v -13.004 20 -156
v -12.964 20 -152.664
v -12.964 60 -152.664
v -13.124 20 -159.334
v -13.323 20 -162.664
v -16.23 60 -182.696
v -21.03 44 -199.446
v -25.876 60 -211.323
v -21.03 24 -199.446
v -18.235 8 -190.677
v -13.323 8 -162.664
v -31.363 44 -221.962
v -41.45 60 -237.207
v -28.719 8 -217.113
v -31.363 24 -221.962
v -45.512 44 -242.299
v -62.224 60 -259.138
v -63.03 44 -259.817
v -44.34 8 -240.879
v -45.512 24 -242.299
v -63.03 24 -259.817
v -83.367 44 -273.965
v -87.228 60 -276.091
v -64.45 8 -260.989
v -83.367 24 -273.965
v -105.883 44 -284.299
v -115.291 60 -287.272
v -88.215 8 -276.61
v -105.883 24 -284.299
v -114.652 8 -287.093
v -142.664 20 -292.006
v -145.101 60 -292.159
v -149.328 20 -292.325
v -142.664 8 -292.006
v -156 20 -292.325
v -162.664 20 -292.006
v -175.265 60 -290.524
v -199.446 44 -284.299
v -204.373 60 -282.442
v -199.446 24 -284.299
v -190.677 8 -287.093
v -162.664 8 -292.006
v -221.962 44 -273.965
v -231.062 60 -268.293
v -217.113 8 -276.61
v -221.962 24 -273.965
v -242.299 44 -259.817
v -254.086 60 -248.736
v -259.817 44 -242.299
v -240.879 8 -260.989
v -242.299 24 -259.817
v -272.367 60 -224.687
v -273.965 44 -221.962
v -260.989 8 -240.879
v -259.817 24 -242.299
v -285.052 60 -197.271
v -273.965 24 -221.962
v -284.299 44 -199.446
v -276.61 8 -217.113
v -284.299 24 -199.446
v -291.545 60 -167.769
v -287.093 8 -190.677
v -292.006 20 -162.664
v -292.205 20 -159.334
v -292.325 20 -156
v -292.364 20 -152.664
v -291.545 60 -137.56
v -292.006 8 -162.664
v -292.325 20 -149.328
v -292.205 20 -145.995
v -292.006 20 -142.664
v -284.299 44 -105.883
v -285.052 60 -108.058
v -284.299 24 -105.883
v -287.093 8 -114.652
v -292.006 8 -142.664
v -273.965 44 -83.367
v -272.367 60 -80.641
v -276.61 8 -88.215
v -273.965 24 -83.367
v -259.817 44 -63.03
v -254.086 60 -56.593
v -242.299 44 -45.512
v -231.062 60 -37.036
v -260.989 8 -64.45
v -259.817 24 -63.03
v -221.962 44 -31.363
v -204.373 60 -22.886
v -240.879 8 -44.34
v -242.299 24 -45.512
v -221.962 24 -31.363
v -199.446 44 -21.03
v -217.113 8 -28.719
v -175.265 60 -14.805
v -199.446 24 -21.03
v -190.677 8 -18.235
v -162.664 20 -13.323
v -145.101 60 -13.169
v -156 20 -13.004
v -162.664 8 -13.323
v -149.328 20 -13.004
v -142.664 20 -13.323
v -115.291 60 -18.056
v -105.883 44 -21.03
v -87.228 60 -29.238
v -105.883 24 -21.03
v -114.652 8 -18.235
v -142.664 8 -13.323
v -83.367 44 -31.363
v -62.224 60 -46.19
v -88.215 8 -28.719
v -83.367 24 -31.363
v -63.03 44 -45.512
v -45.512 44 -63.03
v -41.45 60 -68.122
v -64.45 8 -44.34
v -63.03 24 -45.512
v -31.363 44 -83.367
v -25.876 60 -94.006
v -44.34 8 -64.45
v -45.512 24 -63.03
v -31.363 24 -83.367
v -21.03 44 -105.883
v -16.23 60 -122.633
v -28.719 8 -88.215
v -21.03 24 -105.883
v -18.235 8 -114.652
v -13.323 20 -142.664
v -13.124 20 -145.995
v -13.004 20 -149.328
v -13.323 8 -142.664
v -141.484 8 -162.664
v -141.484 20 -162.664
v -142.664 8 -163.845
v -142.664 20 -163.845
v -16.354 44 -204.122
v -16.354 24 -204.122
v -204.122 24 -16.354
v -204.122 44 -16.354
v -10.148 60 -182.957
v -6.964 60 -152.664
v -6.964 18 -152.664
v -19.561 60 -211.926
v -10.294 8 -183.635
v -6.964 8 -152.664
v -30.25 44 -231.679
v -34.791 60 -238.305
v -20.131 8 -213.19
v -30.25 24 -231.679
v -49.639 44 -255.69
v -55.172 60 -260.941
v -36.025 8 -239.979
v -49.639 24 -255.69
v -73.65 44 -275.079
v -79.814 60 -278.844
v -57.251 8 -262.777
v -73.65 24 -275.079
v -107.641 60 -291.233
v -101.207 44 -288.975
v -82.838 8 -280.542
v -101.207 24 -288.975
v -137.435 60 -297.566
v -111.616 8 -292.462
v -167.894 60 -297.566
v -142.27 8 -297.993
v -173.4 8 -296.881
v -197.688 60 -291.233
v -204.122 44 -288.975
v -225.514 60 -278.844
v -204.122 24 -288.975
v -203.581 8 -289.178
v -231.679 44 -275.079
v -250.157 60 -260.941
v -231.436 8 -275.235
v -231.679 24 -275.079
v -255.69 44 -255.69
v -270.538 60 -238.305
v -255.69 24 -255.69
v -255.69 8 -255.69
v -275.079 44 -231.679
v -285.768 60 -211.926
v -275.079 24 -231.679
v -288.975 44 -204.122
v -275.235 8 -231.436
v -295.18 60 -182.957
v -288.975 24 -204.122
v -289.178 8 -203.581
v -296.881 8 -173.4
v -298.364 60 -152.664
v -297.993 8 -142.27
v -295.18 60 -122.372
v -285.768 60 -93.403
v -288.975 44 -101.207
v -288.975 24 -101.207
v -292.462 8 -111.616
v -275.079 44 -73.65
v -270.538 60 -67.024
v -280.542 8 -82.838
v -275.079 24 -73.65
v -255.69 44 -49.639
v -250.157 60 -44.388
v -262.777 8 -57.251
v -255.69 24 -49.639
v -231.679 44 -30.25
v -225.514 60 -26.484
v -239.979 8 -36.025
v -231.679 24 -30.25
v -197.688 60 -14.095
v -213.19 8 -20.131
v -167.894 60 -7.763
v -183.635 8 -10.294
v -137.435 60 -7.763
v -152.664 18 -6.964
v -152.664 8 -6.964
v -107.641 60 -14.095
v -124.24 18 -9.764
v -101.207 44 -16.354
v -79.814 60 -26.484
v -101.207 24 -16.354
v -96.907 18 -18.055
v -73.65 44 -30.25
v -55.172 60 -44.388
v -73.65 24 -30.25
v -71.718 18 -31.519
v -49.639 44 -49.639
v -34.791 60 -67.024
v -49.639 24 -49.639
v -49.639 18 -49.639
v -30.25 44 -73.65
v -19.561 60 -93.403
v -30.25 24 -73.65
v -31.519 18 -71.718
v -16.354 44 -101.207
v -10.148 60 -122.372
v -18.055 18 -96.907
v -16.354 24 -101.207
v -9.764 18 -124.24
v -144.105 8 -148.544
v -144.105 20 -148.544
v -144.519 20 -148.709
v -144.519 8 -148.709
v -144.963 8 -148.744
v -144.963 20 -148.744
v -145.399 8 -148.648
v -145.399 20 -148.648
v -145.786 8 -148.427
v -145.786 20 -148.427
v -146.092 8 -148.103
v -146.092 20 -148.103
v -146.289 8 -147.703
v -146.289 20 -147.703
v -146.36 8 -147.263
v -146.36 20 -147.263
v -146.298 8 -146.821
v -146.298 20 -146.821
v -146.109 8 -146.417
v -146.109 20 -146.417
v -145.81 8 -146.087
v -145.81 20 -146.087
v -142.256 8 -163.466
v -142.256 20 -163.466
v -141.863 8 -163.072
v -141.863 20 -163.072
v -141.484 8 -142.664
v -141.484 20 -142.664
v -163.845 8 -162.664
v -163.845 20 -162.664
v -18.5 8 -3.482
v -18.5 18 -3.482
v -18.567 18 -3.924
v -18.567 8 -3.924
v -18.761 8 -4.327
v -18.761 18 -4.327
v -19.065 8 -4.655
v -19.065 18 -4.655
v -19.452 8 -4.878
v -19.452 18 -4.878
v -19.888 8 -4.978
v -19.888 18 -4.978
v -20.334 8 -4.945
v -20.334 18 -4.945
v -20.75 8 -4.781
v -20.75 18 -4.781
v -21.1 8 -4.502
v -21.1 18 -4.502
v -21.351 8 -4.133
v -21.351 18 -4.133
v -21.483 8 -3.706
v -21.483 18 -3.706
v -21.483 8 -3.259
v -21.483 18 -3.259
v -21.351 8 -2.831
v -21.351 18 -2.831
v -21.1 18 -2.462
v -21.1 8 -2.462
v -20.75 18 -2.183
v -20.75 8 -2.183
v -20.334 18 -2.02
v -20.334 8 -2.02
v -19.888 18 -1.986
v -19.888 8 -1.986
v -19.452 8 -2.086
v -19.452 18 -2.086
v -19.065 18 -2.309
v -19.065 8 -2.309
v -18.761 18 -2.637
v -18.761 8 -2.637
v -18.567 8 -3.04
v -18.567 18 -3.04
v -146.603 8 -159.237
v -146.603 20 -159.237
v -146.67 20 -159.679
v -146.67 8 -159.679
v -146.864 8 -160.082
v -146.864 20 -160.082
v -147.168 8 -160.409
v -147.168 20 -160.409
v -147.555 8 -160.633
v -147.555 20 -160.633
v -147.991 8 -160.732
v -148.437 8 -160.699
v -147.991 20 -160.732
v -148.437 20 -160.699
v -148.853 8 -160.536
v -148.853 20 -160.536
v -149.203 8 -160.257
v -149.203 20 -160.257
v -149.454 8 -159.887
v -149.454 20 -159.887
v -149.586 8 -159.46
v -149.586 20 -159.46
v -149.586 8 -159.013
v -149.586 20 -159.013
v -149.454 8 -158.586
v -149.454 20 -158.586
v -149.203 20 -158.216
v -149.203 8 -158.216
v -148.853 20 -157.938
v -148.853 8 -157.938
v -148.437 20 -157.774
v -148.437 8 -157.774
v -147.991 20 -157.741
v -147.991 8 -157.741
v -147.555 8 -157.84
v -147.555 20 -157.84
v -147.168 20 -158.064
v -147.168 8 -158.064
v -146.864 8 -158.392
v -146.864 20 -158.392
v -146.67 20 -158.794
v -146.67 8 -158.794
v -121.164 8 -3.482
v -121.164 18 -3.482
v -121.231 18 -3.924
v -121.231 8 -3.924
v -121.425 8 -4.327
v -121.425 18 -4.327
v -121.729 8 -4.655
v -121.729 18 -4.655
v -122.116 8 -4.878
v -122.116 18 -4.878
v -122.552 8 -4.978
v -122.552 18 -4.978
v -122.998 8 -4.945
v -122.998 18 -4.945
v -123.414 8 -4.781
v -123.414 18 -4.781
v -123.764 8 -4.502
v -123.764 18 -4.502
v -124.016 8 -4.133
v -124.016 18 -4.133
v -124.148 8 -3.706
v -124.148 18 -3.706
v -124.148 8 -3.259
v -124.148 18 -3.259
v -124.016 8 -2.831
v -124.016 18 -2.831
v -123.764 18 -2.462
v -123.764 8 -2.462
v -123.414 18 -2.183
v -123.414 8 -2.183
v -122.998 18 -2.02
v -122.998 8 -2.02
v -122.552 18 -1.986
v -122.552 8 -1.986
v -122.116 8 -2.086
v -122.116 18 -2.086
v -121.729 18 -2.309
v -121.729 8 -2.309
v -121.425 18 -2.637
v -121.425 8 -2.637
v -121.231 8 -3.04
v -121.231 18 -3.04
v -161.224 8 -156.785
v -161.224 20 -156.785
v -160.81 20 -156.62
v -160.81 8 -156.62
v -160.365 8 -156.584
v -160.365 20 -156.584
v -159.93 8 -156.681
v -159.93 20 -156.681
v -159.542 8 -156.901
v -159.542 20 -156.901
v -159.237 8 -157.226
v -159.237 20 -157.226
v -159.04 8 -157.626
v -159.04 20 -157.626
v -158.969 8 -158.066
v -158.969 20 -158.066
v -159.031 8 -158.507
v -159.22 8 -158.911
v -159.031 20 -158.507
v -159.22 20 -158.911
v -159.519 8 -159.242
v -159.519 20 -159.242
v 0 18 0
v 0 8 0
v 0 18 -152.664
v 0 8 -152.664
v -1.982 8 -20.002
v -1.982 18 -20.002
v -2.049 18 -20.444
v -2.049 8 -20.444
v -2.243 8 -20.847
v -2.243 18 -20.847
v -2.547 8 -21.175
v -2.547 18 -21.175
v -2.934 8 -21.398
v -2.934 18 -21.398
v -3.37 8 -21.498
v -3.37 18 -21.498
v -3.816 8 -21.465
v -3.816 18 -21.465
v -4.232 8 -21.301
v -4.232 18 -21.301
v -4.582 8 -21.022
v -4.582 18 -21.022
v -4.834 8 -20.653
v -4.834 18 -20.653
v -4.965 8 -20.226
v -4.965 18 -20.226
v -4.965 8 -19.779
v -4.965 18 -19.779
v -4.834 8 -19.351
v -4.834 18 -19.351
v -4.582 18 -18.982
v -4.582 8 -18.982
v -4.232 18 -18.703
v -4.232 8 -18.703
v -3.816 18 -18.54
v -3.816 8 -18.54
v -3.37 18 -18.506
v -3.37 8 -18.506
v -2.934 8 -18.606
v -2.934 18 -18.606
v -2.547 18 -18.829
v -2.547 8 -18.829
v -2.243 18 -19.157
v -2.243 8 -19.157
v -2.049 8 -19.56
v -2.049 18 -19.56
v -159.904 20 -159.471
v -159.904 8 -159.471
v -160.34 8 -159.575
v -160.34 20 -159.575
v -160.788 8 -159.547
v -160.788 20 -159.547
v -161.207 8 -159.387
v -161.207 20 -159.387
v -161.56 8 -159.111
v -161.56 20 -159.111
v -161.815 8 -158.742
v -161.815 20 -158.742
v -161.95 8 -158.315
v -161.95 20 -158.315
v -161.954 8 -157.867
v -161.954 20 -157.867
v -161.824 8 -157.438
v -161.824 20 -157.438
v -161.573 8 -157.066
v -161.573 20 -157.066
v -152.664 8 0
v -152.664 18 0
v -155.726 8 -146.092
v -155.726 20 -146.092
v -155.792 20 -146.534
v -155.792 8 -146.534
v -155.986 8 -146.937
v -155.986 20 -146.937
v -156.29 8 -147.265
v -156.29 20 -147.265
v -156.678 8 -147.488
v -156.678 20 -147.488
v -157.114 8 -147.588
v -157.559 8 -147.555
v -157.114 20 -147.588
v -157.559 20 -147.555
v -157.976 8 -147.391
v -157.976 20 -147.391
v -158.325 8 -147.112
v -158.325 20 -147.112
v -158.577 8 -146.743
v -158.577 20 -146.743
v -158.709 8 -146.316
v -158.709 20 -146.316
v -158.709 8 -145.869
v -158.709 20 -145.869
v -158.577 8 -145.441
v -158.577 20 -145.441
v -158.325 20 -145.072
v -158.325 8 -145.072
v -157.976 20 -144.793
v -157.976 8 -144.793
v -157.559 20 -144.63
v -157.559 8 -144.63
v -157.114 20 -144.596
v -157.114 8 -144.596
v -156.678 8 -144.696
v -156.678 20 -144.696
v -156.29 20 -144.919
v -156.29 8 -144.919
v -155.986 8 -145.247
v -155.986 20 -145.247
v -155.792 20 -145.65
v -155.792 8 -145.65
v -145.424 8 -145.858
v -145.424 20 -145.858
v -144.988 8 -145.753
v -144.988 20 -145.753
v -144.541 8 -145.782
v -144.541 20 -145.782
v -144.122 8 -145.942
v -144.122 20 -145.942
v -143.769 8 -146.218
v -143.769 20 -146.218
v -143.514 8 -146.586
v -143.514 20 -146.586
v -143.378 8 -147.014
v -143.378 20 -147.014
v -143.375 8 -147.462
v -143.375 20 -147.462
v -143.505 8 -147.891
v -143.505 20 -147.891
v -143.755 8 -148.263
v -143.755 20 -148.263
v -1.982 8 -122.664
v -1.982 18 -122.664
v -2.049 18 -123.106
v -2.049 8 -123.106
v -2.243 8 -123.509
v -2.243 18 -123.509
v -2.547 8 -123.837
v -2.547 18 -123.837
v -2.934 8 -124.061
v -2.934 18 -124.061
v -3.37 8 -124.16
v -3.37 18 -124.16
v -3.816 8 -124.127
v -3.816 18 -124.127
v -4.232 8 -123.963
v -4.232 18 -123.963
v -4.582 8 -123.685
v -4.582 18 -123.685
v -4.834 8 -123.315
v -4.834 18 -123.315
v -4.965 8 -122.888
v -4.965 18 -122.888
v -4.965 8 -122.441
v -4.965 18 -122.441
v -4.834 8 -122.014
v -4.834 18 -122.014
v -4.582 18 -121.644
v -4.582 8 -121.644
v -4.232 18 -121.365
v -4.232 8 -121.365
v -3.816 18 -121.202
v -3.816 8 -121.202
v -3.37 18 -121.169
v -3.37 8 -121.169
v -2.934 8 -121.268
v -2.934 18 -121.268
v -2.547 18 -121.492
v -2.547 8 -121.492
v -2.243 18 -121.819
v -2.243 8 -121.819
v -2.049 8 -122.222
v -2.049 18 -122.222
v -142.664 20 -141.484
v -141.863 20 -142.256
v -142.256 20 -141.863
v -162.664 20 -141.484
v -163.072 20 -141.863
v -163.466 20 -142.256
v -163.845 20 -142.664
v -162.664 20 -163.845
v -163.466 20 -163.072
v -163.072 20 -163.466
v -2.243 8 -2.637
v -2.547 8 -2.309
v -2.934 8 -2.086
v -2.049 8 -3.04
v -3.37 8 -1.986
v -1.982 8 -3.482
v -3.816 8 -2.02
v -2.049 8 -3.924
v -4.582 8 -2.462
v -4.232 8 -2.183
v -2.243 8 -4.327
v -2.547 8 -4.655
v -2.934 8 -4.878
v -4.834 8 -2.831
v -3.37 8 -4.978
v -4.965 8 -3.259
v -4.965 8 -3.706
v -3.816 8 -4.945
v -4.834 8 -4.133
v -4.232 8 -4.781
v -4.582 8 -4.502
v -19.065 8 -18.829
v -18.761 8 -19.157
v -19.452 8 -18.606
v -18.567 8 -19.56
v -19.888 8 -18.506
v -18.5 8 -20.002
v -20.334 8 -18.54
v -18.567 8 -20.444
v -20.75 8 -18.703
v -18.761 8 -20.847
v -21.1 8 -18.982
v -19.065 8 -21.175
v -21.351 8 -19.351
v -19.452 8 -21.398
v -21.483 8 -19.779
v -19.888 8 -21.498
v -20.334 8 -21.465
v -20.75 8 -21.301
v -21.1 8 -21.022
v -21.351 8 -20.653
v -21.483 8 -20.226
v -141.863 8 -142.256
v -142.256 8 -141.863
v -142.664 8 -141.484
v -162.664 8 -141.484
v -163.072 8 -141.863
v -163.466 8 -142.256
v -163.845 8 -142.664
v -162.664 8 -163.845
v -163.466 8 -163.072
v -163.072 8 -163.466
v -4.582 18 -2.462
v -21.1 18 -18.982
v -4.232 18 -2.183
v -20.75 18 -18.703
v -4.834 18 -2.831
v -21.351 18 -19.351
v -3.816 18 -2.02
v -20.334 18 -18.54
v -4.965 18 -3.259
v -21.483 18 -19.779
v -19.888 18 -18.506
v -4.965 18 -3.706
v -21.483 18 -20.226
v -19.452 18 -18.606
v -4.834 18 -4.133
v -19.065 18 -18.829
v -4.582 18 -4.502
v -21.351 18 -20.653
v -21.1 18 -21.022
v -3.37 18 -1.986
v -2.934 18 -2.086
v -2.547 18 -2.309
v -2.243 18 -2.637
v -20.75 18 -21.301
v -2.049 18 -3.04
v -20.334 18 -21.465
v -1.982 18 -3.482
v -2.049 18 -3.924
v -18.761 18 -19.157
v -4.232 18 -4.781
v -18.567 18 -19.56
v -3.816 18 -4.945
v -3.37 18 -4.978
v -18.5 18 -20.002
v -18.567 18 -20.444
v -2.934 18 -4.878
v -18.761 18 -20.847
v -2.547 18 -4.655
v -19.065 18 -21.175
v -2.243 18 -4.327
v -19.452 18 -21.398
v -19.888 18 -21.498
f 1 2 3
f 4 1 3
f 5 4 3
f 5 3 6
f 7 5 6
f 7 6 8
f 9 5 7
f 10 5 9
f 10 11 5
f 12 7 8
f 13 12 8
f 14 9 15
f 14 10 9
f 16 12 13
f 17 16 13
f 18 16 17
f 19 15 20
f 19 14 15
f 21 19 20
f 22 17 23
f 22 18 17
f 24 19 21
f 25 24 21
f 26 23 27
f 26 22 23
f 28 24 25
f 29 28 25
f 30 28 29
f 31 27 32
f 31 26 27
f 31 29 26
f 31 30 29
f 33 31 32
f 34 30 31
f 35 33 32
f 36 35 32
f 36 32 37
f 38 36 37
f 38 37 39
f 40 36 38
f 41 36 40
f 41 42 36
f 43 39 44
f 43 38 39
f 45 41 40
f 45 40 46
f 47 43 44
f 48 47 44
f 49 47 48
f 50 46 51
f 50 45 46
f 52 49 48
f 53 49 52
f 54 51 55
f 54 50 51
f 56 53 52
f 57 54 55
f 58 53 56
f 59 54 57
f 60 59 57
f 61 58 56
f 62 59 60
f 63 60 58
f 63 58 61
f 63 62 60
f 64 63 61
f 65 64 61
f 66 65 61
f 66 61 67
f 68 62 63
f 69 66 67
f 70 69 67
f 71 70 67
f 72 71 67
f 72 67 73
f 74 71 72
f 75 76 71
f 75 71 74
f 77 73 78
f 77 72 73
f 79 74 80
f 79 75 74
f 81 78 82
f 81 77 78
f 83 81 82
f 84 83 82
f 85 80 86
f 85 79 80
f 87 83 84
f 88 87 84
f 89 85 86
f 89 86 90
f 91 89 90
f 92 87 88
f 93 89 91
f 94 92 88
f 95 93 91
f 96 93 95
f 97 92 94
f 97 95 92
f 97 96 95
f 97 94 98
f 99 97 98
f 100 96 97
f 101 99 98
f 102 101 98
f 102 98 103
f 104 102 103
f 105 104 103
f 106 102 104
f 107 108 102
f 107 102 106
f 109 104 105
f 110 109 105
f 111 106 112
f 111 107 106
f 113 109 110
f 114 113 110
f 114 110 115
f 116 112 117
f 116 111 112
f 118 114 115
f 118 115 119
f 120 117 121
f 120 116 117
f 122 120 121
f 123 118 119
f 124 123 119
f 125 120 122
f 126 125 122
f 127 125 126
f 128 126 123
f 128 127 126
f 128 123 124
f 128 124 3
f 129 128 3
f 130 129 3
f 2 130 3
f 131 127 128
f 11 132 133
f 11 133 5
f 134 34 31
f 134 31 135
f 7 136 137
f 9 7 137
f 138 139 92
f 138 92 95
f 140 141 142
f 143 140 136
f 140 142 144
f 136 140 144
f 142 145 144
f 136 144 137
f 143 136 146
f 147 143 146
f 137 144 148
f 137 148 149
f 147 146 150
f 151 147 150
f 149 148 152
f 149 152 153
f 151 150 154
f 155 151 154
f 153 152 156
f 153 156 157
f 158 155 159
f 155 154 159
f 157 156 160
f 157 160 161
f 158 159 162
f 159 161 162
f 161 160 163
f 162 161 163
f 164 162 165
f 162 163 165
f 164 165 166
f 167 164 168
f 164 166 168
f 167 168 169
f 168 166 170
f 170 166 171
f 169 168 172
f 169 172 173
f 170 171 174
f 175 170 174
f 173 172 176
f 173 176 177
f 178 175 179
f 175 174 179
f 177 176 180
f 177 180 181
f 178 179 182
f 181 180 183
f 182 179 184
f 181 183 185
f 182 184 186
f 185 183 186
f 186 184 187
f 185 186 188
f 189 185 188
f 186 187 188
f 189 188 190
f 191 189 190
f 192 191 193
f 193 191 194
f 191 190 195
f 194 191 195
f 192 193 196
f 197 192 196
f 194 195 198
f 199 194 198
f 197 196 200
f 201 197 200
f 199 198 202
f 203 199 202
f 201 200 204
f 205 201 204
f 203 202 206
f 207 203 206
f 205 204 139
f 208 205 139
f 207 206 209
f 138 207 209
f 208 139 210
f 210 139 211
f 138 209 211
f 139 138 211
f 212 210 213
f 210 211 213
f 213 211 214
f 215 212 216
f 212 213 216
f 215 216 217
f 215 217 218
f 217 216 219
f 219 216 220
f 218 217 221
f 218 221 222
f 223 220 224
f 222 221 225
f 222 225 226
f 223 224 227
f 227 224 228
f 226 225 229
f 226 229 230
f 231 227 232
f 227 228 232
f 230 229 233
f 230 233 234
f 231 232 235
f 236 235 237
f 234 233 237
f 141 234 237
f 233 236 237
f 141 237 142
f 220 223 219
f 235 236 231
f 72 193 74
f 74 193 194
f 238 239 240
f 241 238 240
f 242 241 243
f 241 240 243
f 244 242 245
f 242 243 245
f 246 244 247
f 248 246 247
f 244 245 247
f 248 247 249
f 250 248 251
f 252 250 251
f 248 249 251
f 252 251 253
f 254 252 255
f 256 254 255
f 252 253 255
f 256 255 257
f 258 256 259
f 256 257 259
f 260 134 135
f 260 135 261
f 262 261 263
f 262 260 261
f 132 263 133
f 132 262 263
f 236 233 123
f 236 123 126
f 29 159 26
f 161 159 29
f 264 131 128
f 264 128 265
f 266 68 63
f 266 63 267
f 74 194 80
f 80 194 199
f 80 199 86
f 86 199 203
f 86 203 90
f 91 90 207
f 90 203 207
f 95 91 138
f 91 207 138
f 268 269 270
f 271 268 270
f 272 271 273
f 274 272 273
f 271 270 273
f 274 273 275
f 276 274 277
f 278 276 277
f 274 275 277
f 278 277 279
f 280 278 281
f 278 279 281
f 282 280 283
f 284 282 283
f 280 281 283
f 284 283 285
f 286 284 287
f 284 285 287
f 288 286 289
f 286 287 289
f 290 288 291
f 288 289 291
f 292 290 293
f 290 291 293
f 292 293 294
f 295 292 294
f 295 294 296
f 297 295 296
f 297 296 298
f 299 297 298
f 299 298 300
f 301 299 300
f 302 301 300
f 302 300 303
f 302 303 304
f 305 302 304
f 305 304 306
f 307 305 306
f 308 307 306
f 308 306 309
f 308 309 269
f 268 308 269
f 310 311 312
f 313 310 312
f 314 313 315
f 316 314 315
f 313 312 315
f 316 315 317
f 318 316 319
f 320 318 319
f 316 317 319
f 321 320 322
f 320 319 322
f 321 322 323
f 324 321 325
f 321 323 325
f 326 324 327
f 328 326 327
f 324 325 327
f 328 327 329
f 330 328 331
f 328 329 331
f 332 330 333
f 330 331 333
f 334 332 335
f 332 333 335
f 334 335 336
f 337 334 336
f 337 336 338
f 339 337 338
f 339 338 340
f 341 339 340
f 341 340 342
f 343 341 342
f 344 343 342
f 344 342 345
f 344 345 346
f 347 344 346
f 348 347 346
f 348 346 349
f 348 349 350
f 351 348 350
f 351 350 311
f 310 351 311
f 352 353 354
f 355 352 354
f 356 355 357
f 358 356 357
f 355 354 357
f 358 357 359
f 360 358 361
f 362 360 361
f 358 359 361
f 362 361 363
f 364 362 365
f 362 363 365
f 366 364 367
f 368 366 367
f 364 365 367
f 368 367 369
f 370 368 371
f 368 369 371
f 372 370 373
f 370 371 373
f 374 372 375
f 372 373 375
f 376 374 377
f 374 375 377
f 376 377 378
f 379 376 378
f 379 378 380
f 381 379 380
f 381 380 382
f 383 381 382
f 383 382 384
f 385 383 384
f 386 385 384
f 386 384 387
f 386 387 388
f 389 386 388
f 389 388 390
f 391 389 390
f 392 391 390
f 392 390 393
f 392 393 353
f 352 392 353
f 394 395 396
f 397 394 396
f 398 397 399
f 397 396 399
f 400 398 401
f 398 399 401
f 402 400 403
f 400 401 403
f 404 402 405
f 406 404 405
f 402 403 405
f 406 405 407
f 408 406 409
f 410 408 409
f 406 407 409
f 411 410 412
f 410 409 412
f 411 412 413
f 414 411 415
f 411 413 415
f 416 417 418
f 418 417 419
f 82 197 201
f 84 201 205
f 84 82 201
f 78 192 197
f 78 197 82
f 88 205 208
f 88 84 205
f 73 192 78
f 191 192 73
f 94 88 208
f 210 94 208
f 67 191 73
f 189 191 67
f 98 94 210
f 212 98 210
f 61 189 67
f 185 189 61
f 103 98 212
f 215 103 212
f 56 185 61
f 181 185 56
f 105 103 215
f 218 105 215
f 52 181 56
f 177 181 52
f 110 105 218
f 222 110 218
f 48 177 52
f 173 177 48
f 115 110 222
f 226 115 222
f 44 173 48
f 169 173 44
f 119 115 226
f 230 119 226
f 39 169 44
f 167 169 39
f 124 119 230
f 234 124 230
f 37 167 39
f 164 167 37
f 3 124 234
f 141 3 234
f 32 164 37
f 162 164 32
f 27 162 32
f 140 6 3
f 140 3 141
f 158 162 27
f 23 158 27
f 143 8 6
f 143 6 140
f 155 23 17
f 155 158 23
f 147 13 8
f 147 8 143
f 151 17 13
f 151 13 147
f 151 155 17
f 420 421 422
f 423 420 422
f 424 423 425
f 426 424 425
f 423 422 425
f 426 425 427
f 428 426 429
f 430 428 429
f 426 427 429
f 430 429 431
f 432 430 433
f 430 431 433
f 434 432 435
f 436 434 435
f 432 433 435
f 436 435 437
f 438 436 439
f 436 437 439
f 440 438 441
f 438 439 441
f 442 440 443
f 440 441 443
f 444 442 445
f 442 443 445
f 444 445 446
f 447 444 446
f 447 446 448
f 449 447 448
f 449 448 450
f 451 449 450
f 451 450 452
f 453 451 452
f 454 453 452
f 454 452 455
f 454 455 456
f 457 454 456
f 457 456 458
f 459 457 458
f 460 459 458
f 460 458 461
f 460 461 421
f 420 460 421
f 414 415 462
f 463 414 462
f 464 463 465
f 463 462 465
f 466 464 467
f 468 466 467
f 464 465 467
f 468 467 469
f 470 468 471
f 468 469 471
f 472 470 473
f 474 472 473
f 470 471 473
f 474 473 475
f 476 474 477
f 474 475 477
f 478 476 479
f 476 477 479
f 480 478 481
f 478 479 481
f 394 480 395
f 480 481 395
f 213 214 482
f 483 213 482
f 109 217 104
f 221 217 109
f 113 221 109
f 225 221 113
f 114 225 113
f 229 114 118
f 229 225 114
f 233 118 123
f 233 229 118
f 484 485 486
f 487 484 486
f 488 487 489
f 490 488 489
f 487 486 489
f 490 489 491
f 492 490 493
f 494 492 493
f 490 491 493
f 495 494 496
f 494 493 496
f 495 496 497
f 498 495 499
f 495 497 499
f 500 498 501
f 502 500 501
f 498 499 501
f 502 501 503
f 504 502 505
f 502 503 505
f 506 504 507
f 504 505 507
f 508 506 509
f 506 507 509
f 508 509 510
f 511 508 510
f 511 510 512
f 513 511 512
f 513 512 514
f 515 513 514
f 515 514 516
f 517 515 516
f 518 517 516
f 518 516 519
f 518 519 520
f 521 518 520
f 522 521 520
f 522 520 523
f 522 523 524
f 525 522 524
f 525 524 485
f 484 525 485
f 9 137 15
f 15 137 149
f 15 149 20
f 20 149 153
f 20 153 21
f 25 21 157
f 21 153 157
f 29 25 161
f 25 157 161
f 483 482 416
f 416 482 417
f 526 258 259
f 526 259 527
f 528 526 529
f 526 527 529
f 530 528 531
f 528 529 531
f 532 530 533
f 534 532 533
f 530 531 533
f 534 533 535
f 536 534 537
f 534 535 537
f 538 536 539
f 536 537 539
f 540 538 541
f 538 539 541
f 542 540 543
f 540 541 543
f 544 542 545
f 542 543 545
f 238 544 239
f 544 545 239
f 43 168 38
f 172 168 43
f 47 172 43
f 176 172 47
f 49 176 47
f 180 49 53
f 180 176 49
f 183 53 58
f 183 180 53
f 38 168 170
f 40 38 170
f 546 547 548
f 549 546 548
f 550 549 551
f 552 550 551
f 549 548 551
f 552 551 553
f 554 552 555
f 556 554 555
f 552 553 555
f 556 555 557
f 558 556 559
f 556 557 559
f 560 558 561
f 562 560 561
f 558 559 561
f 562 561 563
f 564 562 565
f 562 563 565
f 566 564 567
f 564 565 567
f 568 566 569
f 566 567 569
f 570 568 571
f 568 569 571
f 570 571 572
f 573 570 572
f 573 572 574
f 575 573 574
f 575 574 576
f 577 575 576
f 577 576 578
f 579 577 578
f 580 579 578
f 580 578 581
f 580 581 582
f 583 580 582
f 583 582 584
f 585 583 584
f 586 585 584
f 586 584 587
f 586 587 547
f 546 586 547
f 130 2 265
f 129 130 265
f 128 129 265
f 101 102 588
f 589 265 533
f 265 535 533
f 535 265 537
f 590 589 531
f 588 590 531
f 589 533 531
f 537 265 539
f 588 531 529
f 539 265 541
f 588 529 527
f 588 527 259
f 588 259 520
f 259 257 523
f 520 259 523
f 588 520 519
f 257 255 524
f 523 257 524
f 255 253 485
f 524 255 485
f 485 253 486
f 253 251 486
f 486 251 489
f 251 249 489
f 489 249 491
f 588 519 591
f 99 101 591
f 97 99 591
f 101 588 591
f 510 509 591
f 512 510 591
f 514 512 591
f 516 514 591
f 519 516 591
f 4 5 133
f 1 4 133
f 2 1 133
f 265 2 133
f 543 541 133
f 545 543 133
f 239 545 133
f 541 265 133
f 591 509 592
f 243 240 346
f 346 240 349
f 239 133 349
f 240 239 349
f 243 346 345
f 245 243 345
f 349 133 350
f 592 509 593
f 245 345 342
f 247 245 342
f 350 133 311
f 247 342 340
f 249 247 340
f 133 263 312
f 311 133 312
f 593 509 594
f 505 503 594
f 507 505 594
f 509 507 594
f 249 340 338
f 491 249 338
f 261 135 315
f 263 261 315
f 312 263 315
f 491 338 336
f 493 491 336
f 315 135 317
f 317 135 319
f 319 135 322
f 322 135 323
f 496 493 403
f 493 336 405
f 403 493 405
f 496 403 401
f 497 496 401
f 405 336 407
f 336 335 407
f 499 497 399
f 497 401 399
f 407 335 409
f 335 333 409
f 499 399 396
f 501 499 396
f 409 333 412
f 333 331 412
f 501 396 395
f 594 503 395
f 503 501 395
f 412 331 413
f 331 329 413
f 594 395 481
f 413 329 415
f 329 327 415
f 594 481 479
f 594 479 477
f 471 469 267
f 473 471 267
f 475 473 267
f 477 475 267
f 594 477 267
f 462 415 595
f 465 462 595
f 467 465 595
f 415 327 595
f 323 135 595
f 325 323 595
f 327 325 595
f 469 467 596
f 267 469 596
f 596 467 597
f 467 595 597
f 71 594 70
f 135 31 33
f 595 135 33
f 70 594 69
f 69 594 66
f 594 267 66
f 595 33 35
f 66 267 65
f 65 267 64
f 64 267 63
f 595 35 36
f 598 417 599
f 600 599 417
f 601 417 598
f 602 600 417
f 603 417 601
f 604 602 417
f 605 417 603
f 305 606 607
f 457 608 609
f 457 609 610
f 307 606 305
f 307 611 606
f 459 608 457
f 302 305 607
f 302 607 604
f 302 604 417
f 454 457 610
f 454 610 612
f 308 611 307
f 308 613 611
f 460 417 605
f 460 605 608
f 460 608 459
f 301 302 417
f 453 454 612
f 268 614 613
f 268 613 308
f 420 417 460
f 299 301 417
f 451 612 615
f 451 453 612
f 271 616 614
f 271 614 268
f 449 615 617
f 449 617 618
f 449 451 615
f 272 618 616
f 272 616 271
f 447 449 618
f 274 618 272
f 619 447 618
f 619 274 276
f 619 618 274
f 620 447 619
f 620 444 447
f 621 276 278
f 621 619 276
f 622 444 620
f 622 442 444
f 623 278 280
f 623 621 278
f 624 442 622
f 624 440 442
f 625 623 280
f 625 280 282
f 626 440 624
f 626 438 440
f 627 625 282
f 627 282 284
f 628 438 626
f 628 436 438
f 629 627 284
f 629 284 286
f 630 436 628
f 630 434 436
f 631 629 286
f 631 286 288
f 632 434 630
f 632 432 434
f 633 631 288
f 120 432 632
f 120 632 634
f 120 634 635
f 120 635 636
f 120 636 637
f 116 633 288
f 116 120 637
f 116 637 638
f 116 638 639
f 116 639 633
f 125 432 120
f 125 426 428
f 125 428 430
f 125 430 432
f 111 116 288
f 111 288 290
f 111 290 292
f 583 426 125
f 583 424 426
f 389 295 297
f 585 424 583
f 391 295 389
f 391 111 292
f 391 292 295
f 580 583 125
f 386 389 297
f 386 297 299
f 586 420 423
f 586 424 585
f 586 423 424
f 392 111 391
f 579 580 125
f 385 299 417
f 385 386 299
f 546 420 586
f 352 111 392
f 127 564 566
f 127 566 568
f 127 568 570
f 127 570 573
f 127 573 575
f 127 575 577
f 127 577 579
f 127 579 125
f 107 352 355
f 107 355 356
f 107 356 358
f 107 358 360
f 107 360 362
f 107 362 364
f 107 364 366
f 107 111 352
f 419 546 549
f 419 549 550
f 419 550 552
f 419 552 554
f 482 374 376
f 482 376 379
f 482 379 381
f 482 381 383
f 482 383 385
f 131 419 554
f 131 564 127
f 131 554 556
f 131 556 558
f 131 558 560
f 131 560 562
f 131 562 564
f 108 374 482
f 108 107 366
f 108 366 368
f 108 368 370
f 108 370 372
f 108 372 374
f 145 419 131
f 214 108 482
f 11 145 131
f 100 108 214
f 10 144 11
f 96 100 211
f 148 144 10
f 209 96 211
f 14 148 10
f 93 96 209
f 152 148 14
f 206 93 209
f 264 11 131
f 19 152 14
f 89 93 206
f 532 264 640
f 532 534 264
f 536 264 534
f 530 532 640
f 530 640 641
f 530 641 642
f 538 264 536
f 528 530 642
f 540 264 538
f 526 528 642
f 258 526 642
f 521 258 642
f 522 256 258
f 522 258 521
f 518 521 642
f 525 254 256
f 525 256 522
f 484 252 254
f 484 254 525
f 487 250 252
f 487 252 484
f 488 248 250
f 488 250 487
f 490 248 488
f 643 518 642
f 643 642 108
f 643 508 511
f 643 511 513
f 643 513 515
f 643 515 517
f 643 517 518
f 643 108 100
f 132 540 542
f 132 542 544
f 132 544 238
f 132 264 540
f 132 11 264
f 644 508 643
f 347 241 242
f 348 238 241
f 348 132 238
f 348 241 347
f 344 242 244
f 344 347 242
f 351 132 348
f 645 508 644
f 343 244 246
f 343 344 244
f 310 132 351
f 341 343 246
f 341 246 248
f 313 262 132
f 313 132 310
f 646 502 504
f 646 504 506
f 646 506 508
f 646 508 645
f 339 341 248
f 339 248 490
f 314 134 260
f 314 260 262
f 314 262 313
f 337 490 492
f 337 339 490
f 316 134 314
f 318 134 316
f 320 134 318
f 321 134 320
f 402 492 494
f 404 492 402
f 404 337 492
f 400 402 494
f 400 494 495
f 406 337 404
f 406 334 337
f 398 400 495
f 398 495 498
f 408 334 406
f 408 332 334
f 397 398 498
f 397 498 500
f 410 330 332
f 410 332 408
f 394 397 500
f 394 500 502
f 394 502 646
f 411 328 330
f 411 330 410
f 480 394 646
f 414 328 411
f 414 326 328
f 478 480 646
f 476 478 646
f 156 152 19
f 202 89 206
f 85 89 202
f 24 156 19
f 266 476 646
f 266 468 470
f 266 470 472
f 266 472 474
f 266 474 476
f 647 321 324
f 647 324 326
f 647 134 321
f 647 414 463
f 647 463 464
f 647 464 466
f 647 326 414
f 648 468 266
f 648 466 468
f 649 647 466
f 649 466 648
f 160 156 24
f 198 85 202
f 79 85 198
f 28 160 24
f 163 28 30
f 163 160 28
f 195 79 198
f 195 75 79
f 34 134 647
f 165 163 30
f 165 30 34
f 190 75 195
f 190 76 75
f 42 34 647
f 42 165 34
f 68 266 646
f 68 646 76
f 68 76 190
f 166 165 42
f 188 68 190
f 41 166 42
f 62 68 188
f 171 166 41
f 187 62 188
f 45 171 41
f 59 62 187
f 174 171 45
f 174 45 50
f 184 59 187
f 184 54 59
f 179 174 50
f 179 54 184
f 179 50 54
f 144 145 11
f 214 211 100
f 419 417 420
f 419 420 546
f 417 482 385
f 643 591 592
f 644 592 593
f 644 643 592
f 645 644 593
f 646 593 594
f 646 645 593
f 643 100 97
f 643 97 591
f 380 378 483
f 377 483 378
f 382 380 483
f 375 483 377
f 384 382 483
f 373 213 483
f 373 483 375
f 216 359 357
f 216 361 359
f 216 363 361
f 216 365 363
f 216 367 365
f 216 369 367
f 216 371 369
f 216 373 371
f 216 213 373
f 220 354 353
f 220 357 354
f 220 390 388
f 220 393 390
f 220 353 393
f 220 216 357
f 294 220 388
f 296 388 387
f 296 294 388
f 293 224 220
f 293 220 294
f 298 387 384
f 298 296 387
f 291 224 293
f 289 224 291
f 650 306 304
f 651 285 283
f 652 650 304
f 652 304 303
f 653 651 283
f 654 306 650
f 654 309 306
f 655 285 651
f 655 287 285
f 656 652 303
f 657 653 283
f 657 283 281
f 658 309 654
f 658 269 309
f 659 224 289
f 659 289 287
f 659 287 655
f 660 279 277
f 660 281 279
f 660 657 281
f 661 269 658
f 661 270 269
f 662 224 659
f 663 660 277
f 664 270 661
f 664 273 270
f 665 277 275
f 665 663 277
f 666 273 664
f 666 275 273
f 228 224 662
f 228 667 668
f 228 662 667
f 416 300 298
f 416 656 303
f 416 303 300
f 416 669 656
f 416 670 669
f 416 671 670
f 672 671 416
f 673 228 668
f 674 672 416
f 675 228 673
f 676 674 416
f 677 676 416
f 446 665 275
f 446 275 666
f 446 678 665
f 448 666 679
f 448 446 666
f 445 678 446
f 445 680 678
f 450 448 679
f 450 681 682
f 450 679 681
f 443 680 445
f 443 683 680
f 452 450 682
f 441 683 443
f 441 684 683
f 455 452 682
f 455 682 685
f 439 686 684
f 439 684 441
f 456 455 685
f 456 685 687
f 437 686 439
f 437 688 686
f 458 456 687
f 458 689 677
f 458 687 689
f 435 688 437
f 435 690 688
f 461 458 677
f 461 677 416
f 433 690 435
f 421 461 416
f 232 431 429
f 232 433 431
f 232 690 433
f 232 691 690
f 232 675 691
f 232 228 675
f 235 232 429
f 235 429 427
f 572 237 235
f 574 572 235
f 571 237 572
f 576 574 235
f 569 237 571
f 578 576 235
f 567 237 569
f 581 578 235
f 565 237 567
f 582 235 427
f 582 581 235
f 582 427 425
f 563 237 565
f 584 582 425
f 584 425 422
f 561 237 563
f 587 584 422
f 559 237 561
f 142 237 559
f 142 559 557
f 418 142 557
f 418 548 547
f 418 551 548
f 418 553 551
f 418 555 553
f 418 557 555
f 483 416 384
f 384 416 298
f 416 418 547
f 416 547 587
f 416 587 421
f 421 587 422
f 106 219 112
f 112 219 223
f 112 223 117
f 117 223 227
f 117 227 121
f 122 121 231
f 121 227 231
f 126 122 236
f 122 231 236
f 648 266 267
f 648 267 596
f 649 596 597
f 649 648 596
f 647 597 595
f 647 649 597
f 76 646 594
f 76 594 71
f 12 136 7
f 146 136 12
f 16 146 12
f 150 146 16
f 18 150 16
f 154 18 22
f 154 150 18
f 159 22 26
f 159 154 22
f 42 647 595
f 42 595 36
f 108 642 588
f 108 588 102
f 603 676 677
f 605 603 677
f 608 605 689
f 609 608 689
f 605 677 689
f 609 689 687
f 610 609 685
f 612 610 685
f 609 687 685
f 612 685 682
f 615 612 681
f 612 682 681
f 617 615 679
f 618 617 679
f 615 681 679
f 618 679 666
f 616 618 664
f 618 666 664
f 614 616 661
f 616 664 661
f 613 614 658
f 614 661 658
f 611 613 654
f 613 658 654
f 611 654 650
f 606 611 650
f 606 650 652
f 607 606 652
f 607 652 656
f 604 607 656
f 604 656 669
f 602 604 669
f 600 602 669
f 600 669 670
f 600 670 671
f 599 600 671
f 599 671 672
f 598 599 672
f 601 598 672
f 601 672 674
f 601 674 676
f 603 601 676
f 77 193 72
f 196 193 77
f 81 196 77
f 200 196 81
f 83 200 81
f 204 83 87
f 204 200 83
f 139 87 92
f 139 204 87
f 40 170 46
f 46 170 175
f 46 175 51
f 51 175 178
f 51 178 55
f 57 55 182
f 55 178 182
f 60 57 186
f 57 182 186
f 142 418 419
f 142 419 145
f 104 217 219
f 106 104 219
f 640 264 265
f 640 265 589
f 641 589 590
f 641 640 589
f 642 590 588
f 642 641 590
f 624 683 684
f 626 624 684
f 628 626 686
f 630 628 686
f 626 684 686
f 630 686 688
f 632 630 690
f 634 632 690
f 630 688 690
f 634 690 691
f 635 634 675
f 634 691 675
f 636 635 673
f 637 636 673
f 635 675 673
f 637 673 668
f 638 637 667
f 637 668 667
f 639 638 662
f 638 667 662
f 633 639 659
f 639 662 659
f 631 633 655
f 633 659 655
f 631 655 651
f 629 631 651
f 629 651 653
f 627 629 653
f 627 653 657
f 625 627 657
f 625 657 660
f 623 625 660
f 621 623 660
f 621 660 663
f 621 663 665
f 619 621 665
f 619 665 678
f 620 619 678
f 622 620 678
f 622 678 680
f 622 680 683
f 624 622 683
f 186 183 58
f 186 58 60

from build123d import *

# Parameters (mm, degrees)
SKETCH1_R           = 145.7
SKETCH1_R_2         = 139.7
BOSS_EXTRUDE1_DEPTH = 60
SKETCH2_R           = 15
BOSS_EXTRUDE2_DEPTH = 12
BOSS_EXTRUDE3_DEPTH = 10
SKETCH4_R           = 1.5
CUT_EXTRUDE1_DEPTH  = 62
SKETCH1_2_R         = 145.7
SKETCH1_2_R_2       = 139.7
CUT_EXTRUDE2_DEPTH  = 8
SKETCH5_W           = 20
SKETCH5_H           = 120
CUT_EXTRUDE3_DEPTH  = 55
CIRPATTERN1_COUNT   = 4
SKETCH6_R           = 1.5
CUT_EXTRUDE4_DEPTH  = 37


with BuildPart() as part:
    # Sketch1 → Boss-Extrude1 (new body)
    with BuildSketch(Plane(origin=(0, 0, 0), x_dir=(1, 0, 0), z_dir=(0, 1, 0))):
        with Locations((-152.664354058, 152.664354058)):
            Circle(SKETCH1_R)
        with Locations((-152.664354058, 152.664354058)):
            Circle(SKETCH1_R_2, mode=Mode.SUBTRACT)
    extrude(amount=BOSS_EXTRUDE1_DEPTH)

    # Sketch2 → Boss-Extrude2 (add)
    with BuildSketch(Plane(origin=(0, 8, 0), x_dir=(-1, 0, 0), z_dir=(0, -1, 0))):
        with BuildLine():
            ThreePointArc((13.322723524, 162.664354058), (12.964354058, 152.664354058), (13.322723524, 142.664354058))
            Line((13.322723524, 142.664354058), (137.664354058, 142.664354058))
            Line((137.664354058, 142.664354058), (141.484014171, 142.664354058))
            ThreePointArc((141.484014171, 142.664354058), (137.664354058, 152.664354058), (141.484014171, 162.664354058))
            Line((141.484014171, 162.664354058), (137.664354058, 162.664354058))
            Line((137.664354058, 162.664354058), (13.322723524, 162.664354058))
        make_face()
        with BuildLine():
            ThreePointArc((162.664354058, 292.005984593), (152.664354058, 292.364354058), (142.664354058, 292.005984593))
            Line((142.664354058, 292.005984593), (142.664354058, 167.664354058))
            Line((142.664354058, 167.664354058), (142.664354058, 163.844693946))
            ThreePointArc((142.664354058, 163.844693946), (152.664354058, 167.664354058), (162.664354058, 163.844693946))
            Line((162.664354058, 163.844693946), (162.664354058, 167.664354058))
            Line((162.664354058, 167.664354058), (162.664354058, 292.005984593))
        make_face()
        with BuildLine():
            Line((167.664354058, 142.664354058), (292.005984593, 142.664354058))
            ThreePointArc((292.005984593, 142.664354058), (292.274732945, 147.661144372), (292.364354058, 152.664354058))
            ThreePointArc((292.364354058, 152.664354058), (292.274732945, 157.667563745), (292.005984593, 162.664354058))
            Line((292.005984593, 162.664354058), (167.664354058, 162.664354058))
            Line((167.664354058, 162.664354058), (163.844693946, 162.664354058))
            ThreePointArc((163.844693946, 162.664354058), (166.676939443, 158.016685405), (167.664354058, 152.664354058))
            ThreePointArc((167.664354058, 152.664354058), (166.676939443, 147.312022712), (163.844693946, 142.664354058))
            Line((163.844693946, 142.664354058), (167.664354058, 142.664354058))
        make_face()
        with BuildLine():
            Line((142.664354058, 141.484014171), (142.664354058, 137.664354058))
            Line((142.664354058, 137.664354058), (142.664354058, 13.322723524))
            ThreePointArc((142.664354058, 13.322723524), (152.664354058, 12.964354058), (162.664354058, 13.322723524))
            Line((162.664354058, 13.322723524), (162.664354058, 137.664354058))
            Line((162.664354058, 137.664354058), (162.664354058, 141.484014171))
            ThreePointArc((162.664354058, 141.484014171), (152.664354058, 137.664354058), (142.664354058, 141.484014171))
        make_face()
        with Locations((152.664354058, 152.664354058)):
            Circle(SKETCH2_R)
    extrude(amount=-BOSS_EXTRUDE2_DEPTH)

    # Sketch3 → Boss-Extrude3 (add)
    with BuildSketch(Plane(origin=(0, 8, 0), x_dir=(-1, 0, 0), z_dir=(0, -1, 0))):
        with BuildLine():
            Line((152.664354058, 6.964354058), (152.664354058, 0))
            Line((152.664354058, 0), (0, 0))
            Line((0, 0), (0, 152.664354058))
            Line((0, 152.664354058), (6.964354058, 152.664354058))
            ThreePointArc((6.964354058, 152.664354058), (49.638896039, 49.638896039), (152.664354058, 6.964354058))
        make_face()
    extrude(amount=-BOSS_EXTRUDE3_DEPTH)

    # Sketch4 → Cut-Extrude1 (cut)
    with BuildSketch(Plane(origin=(0, 18, 0), x_dir=(1, 0, 0), z_dir=(0, 1, 0))):
        with Locations((-122.664354058, 3.482177029)):
            Circle(SKETCH4_R)
        with Locations((-20, 3.482177029)):
            Circle(SKETCH4_R)
        with Locations((-20, 20.002177029)):
            Circle(SKETCH4_R)
        with Locations((-3.482177029, 20.002177029)):
            Circle(SKETCH4_R)
        with Locations((-3.482177029, 3.482177029)):
            Circle(SKETCH4_R)
        with Locations((-3.482177029, 122.664354058)):
            Circle(SKETCH4_R)
    extrude(amount=-CUT_EXTRUDE1_DEPTH, mode=Mode.SUBTRACT)

    # Sketch1<2> → Cut-Extrude2 (cut)
    with BuildSketch(Plane(origin=(0, 0, 0), x_dir=(1, 0, 0), z_dir=(0, 1, 0))):
        with Locations((-152.664354058, 152.664354058)):
            Circle(SKETCH1_2_R)
        with Locations((-152.664354058, 152.664354058)):
            Circle(SKETCH1_2_R_2, mode=Mode.SUBTRACT)
    extrude(amount=CUT_EXTRUDE2_DEPTH, mode=Mode.SUBTRACT)

    # Sketch5 → Cut-Extrude3 (cut)
    with BuildSketch(Plane(origin=(-255.689812077, 0, -255.689812077), x_dir=(0, -1, 0), z_dir=(-0.707106781, 0, -0.707106781))):
        with Locations((-34, 0)):
            Rectangle(SKETCH5_W, SKETCH5_H)
    cut_extrude3 = extrude(amount=-CUT_EXTRUDE3_DEPTH, mode=Mode.SUBTRACT)

    # CirPattern1: Cut-Extrude3 ×4 about axis
    cirpattern1_axis = Axis((-152.664354058, 0, -152.664354058), (0, 1, 0))
    for i in range(1, CIRPATTERN1_COUNT):
        add(cut_extrude3.rotate(cirpattern1_axis, i * 360 / CIRPATTERN1_COUNT), mode=Mode.SUBTRACT)

    # Sketch6 → Cut-Extrude4 (cut)
    with BuildSketch(Plane(origin=(0, 20, 0), x_dir=(1, 0, 0), z_dir=(0, 1, 0))):
        with BuildLine():
            ThreePointArc((-144.104525473, 148.543755244), (-146.092112388, 148.103034136), (-145.809681622, 146.086857134))
            ThreePointArc((-145.809681622, 146.086857134), (-143.627521762, 146.392539165), (-144.104525473, 148.543755244))
        make_face()
        with Locations((-157.22567398, 146.092112388)):
            Circle(SKETCH6_R)
        with Locations((-148.103034136, 159.236595728)):
            Circle(SKETCH6_R)
        with BuildLine():
            ThreePointArc((-159.519026494, 159.241850983), (-161.701186354, 158.936168951), (-161.224182644, 156.784952872))
            ThreePointArc((-161.224182644, 156.784952872), (-159.236595728, 157.22567398), (-159.519026494, 159.241850983))
        make_face()
    extrude(amount=-CUT_EXTRUDE4_DEPTH, mode=Mode.SUBTRACT)


solid = part.part
